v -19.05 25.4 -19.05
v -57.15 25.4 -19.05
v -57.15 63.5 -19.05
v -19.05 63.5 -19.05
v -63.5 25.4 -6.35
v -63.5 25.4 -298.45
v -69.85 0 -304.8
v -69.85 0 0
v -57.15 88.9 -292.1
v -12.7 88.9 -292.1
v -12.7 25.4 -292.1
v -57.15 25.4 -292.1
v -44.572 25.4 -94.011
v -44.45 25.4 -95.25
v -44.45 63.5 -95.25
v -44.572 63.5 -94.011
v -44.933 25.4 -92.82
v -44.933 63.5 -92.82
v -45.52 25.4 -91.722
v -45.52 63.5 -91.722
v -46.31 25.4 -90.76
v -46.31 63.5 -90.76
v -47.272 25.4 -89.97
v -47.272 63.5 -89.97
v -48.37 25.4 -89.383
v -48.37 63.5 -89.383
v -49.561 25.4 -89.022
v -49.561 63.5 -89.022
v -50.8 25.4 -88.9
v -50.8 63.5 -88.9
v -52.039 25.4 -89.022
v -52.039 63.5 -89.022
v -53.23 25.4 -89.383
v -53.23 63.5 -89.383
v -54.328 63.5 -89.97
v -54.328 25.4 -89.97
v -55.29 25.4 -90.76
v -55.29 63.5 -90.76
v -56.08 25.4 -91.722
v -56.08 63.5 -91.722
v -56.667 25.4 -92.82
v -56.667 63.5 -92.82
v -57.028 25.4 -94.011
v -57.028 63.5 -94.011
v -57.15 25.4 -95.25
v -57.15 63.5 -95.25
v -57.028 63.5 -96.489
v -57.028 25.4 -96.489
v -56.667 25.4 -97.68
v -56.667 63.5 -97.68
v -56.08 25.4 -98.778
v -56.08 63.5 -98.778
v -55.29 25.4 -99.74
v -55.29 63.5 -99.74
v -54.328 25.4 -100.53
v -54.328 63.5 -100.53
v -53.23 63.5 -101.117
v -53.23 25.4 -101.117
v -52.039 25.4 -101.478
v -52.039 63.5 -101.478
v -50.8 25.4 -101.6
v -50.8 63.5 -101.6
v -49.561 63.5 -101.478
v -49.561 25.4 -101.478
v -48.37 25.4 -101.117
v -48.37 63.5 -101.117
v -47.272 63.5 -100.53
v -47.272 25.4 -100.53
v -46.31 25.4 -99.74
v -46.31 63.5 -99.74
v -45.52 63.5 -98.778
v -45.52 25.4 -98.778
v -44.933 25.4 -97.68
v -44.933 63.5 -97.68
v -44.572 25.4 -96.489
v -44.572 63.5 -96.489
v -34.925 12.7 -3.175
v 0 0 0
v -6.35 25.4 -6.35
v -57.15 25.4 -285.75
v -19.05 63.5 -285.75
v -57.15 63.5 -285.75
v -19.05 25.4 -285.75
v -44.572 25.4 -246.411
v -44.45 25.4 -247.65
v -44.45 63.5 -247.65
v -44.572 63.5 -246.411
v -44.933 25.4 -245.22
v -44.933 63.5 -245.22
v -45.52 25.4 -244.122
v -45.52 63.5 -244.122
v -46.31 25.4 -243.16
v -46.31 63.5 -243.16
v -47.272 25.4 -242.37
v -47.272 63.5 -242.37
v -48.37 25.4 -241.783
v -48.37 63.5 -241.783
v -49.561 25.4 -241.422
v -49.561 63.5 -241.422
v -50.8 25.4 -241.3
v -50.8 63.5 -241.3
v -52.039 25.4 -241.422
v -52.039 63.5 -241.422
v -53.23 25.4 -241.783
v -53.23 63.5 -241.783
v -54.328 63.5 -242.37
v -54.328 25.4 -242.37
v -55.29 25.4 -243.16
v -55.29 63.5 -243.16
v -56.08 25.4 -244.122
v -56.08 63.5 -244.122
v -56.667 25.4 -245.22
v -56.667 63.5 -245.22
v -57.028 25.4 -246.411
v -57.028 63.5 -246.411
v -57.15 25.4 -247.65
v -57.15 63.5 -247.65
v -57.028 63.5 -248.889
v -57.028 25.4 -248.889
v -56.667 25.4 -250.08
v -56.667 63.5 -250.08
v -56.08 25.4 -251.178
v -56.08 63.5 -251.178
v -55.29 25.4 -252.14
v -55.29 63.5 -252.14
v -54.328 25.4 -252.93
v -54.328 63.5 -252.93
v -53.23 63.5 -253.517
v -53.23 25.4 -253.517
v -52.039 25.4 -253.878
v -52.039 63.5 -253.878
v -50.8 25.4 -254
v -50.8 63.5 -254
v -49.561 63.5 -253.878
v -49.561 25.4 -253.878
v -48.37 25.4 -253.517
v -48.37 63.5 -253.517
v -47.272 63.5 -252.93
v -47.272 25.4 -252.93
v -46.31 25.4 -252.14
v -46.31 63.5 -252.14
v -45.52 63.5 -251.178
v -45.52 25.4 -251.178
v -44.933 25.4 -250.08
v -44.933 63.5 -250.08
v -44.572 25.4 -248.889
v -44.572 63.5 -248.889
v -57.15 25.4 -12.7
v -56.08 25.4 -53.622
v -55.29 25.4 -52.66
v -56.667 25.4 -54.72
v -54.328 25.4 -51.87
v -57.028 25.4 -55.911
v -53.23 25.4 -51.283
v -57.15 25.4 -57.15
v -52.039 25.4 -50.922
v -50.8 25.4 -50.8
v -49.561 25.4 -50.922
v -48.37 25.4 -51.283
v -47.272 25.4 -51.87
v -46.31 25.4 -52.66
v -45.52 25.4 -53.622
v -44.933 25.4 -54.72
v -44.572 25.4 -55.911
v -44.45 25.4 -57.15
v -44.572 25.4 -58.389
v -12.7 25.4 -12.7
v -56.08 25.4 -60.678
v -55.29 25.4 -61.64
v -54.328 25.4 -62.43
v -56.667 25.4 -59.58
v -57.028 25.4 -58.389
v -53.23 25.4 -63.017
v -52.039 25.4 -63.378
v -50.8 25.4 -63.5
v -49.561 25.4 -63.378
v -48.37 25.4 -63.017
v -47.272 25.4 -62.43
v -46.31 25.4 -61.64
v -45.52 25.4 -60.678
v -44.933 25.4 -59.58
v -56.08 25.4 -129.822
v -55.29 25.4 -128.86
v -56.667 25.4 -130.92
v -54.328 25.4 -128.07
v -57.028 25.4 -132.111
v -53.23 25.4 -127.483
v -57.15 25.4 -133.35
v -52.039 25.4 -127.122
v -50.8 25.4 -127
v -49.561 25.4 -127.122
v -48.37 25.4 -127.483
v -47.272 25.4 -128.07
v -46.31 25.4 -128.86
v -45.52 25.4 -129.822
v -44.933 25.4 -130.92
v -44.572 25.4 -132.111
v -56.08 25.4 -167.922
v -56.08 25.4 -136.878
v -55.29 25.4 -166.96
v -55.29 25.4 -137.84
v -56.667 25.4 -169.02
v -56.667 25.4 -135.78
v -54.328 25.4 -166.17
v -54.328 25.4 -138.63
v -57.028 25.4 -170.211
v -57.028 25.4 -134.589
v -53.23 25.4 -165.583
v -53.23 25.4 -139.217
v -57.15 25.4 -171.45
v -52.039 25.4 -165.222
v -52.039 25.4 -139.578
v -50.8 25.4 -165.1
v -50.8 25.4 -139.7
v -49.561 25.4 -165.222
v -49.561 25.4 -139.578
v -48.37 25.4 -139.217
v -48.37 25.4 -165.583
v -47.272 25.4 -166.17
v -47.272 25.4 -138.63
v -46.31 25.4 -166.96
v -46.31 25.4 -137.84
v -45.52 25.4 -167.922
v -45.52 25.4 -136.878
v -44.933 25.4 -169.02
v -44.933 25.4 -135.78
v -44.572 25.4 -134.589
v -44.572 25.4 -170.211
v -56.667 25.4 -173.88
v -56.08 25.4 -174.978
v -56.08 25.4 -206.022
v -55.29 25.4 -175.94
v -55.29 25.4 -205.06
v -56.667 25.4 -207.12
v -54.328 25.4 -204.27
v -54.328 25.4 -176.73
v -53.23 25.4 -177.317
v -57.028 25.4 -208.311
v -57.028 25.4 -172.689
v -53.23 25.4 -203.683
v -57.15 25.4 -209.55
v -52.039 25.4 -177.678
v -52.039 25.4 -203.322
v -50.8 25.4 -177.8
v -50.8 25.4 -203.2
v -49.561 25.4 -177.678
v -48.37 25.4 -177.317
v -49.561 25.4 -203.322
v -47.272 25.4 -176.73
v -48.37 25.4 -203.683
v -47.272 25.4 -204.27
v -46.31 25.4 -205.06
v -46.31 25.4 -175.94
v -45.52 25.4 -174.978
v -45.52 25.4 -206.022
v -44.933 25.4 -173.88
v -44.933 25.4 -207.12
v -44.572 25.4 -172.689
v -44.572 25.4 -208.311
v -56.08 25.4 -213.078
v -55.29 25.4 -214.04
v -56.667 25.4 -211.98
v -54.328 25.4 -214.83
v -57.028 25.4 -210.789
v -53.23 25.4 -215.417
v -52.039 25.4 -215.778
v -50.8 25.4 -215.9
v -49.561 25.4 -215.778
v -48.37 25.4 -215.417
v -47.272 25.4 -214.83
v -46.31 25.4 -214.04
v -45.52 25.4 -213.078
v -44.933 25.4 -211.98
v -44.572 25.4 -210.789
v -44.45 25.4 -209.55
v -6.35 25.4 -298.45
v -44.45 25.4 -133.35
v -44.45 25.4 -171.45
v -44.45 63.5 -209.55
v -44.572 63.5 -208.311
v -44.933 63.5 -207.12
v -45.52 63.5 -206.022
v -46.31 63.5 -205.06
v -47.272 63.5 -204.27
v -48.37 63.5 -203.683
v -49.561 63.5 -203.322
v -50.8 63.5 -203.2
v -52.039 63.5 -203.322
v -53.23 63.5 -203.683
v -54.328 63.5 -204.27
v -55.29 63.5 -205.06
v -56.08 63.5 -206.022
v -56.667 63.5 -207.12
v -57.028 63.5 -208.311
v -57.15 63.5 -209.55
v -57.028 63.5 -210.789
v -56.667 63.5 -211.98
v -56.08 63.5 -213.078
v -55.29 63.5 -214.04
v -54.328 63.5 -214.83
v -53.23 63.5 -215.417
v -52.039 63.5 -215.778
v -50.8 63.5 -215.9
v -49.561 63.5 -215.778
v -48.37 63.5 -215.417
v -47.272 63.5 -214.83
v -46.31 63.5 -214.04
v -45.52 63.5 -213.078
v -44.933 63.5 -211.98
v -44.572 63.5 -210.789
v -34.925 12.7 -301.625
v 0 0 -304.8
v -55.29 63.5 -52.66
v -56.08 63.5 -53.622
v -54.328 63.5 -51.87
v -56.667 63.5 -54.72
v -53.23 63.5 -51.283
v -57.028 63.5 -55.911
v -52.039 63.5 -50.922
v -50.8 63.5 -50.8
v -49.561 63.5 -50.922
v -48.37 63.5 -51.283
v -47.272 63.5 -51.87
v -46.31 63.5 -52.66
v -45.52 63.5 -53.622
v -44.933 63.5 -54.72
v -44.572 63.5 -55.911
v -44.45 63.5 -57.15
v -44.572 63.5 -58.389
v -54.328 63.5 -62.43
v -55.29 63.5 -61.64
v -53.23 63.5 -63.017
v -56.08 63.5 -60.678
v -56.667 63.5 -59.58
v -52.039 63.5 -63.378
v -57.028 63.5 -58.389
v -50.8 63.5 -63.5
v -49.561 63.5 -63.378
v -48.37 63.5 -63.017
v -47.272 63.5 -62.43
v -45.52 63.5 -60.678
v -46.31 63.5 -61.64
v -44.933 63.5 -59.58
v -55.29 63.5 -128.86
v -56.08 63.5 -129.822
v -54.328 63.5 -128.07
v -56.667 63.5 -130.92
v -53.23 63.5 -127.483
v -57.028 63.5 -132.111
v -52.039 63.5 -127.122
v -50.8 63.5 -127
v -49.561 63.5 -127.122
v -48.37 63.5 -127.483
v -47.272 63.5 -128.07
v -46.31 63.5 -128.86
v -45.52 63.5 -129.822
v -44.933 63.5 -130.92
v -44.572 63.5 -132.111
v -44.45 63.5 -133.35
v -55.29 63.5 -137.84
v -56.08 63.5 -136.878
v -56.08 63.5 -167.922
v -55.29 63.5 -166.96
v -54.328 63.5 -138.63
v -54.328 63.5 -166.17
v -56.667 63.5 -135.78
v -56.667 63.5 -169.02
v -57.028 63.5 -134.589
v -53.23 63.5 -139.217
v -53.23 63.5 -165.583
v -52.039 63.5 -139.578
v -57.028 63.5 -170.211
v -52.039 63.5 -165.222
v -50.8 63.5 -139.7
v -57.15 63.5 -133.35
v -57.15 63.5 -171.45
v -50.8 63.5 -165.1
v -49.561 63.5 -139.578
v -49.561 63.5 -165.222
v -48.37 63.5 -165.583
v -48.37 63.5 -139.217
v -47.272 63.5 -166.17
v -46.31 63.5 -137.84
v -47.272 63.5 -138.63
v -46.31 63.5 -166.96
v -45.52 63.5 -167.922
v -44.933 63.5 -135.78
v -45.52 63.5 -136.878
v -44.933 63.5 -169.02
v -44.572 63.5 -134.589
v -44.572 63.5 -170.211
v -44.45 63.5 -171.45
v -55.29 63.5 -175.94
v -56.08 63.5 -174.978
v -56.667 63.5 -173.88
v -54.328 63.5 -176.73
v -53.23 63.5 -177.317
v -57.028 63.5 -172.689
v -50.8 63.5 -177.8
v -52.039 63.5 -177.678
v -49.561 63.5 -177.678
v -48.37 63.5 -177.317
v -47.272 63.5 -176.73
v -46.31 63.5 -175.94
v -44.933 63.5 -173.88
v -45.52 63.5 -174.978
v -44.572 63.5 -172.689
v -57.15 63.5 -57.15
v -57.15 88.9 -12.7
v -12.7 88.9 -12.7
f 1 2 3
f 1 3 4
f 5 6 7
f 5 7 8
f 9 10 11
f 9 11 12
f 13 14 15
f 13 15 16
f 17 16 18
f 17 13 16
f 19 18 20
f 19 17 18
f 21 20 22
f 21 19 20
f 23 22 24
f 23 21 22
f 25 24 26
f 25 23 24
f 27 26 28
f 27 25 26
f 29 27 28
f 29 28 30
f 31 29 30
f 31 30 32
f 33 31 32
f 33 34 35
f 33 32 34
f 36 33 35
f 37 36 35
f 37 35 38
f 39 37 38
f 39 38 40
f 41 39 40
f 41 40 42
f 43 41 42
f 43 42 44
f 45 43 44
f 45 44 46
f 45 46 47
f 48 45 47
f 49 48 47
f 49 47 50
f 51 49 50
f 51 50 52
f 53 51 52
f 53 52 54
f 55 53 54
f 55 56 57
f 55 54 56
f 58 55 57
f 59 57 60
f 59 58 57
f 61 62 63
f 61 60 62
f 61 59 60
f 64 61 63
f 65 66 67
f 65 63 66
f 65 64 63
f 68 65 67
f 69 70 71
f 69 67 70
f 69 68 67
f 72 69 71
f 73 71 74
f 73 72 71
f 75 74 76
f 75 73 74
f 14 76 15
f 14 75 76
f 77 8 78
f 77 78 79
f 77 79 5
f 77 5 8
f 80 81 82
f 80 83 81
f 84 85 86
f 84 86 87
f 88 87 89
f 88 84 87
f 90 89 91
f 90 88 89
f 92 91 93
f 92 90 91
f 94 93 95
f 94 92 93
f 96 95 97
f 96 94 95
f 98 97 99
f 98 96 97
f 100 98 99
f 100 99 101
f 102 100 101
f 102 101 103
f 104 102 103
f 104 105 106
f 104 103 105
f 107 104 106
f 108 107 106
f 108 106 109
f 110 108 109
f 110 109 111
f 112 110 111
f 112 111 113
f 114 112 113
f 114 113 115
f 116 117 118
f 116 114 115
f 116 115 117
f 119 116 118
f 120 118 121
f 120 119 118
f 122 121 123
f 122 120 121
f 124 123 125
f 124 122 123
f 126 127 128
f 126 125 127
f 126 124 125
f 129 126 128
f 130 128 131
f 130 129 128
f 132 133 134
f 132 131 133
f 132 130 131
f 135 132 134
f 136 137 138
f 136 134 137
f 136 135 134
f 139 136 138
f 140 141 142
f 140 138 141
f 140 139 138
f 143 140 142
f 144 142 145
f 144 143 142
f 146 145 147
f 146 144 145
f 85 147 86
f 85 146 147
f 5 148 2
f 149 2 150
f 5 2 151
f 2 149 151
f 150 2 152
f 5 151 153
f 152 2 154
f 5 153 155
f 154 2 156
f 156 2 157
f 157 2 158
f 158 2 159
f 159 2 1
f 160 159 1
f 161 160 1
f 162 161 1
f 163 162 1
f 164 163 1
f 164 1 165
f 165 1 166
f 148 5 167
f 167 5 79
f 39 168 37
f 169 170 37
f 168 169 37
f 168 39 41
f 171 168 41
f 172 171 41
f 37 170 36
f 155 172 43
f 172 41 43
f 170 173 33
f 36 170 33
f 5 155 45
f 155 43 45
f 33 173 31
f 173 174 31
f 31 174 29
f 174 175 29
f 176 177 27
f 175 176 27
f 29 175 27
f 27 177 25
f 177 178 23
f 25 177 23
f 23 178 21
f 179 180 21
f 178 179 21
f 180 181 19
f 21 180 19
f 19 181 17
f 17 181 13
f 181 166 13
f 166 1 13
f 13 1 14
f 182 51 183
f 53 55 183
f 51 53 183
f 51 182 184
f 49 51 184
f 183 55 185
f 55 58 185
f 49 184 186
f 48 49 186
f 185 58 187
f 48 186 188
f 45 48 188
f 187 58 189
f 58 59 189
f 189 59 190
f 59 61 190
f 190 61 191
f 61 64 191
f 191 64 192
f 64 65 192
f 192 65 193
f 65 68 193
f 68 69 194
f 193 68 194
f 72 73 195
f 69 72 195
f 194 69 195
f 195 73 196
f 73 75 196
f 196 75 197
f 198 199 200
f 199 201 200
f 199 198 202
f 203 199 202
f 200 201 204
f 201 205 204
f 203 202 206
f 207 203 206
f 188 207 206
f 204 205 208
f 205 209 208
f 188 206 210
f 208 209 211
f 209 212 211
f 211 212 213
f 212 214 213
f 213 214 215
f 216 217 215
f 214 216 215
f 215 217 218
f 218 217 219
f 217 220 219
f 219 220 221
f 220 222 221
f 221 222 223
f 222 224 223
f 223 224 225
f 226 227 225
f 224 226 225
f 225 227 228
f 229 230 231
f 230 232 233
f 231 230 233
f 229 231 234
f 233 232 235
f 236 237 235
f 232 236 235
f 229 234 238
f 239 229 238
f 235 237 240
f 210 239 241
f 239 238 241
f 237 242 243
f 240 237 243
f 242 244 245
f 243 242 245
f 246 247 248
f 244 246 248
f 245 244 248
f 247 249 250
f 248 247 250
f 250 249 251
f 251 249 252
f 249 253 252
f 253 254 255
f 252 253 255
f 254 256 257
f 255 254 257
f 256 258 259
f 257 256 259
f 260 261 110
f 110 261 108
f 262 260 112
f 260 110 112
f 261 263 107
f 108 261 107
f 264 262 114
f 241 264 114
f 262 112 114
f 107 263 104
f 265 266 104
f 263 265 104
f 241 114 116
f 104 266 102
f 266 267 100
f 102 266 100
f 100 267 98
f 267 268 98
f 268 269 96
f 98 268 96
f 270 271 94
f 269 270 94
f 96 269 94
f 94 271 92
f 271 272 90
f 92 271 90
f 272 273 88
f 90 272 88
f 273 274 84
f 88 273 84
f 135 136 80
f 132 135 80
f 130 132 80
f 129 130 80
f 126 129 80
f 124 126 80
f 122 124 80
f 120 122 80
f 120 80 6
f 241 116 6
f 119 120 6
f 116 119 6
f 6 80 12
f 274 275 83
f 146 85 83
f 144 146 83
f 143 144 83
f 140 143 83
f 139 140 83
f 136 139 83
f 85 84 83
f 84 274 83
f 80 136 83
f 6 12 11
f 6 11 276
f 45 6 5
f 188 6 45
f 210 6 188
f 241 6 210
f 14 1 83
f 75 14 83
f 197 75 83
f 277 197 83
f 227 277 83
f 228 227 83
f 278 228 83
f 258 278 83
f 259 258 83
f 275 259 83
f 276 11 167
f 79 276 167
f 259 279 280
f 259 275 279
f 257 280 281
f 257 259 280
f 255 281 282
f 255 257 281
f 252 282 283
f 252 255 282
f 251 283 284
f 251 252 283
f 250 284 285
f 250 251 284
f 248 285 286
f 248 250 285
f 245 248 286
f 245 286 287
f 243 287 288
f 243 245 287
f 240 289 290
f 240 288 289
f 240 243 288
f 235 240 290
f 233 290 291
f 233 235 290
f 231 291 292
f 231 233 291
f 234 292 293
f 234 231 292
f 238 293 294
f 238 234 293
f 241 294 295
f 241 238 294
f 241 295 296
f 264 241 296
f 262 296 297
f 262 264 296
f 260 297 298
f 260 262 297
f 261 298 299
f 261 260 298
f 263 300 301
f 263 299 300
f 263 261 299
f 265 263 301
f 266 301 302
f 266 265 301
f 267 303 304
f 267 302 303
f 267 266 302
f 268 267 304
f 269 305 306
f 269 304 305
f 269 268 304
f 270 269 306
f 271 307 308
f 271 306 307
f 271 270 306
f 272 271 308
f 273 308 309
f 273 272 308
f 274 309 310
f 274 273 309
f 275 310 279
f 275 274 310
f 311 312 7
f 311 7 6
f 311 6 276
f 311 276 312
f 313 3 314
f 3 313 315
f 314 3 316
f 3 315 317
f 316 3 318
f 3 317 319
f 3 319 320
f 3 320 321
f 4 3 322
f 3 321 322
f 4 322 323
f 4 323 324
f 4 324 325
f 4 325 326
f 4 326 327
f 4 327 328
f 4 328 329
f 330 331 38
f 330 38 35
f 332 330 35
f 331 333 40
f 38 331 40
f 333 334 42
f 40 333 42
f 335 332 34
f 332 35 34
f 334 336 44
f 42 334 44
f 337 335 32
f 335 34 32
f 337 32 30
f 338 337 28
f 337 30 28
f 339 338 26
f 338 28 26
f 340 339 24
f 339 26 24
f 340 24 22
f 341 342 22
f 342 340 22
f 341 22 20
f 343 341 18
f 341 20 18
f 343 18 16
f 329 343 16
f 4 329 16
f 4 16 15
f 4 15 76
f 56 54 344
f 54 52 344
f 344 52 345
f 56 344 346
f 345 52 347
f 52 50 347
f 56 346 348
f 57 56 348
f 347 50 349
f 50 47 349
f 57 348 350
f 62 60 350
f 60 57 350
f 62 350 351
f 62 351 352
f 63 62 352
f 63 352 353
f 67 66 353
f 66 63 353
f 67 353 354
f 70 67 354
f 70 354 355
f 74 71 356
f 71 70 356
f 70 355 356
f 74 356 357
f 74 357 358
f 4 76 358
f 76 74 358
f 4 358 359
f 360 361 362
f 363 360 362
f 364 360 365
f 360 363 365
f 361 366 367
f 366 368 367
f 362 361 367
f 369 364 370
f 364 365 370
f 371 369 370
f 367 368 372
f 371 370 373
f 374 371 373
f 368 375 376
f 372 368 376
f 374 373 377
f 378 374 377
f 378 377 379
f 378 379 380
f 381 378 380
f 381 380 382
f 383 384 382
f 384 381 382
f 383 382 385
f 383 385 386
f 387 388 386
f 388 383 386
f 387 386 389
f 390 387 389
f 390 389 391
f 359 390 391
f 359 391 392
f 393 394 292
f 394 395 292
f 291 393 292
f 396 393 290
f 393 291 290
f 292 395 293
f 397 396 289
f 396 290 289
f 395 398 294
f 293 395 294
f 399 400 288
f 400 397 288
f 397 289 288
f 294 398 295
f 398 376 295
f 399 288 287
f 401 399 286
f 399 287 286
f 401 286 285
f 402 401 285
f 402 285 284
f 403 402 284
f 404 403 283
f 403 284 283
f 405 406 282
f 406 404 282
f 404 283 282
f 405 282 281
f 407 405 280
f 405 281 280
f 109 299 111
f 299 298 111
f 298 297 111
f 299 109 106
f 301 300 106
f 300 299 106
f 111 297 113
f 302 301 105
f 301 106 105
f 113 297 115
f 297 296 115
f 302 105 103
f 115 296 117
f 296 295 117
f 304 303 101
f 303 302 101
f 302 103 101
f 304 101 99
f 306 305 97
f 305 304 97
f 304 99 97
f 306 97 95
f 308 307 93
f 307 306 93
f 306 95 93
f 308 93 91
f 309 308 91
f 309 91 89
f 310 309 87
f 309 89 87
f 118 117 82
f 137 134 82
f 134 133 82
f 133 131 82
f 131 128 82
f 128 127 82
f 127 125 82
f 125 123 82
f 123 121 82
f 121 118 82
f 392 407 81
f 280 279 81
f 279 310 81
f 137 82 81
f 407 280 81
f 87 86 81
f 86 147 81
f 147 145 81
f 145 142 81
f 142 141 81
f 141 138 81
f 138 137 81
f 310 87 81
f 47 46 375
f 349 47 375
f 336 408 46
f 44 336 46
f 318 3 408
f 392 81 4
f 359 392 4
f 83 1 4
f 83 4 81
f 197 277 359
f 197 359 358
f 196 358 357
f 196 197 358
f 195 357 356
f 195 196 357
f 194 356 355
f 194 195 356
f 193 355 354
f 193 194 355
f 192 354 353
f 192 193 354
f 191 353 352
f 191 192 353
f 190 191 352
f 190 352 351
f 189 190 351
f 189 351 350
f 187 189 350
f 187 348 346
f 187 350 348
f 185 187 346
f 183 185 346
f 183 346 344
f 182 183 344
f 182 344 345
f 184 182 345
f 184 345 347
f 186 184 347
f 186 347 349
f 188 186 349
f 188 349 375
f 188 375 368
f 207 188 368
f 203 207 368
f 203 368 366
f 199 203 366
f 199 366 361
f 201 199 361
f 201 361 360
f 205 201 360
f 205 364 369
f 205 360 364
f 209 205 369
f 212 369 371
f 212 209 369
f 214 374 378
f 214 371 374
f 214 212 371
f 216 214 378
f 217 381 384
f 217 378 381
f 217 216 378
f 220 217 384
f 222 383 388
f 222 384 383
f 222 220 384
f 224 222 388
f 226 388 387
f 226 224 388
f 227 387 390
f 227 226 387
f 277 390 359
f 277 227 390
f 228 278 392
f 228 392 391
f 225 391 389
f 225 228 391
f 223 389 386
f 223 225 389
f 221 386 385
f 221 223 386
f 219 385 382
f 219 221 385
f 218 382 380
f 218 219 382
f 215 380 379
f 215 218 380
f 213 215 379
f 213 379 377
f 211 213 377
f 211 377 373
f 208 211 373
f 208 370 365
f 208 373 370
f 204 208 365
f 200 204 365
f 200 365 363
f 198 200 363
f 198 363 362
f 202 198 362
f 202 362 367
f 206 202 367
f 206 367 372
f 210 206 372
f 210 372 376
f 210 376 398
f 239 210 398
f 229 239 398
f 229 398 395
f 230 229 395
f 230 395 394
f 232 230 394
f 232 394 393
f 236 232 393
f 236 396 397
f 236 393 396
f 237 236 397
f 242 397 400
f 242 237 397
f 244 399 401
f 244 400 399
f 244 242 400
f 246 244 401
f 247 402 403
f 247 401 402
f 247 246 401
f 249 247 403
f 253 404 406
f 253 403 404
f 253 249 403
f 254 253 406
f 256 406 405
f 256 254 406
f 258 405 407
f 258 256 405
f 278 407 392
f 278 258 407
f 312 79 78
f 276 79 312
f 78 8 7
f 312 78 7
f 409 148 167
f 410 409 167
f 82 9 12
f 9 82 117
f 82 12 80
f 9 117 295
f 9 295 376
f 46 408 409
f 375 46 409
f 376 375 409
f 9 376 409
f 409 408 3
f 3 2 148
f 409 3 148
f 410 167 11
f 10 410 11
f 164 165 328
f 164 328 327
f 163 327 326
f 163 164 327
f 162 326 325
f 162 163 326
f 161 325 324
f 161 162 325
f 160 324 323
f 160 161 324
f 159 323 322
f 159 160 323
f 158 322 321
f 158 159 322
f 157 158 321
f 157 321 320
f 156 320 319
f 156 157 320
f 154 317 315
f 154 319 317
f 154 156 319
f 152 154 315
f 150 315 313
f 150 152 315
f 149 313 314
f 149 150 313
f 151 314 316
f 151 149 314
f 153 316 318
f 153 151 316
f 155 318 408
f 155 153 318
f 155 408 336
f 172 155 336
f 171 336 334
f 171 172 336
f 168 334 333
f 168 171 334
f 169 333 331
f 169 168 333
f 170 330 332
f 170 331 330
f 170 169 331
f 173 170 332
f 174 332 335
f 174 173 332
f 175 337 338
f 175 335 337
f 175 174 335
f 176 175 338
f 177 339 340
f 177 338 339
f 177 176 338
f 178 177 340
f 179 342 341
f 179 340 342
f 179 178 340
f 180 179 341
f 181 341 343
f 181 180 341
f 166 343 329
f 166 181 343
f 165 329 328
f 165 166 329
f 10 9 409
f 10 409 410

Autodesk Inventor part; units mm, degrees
ref_plane "YZ Plane" through (0, 0, 0) normal (1, 0, 0) x (0, 1, 0)
ref_plane "XY Plane" through (0, 0, 0) normal (0, 0, 1) x (1, 0, 0)
sketch "Sketch1" plane through (0, 0, 0) normal (0, 1, 0) x (-1, 0, 0)
  line L0 (0, 0) -> (69.85, 0)
  line L1 (69.85, 0) -> (69.85, -304.8)
  line L2 (69.85, -304.8) -> (0, -304.8)
  line L3 (0, -304.8) -> (0, 0)
  dimension "d0" = 69.85
  dimension "d1" = 304.8
ref_plane "Work Plane1" through (0, 25.4, 0) normal (0, 1, 0) x (-1, 0, 0)
sketch "Sketch2" plane through (0, 25.4, 0) normal (0, 1, 0) x (-1, 0, 0)
  line L0 (0, 0) -> (69.85, 0) projected
  line L1 (69.85, 0) -> (69.85, -304.8) projected
  line L2 (69.85, -304.8) -> (0, -304.8) projected
  line L3 (0, -304.8) -> (0, 0) projected
  line L4 (63.5, -298.45) -> (63.5, -6.35)
  line L5 (63.5, -6.35) -> (6.35, -6.35)
  line L6 (6.35, -6.35) -> (6.35, -298.45)
  line L7 (6.35, -298.45) -> (63.5, -298.45)
  dimension "d3" = 6.35
loft "Loft1" add profiles "Sketch1", "Sketch2" contours all / L7 L6 L5 L4
sketch "Sketch3" plane through (-63.5, 25.4, -6.35) normal (0, 1, 0) x (1, 0, 0)
  line L0 (57.15, 0) -> (0, 0) projected
  line L1 (57.15, 292.1) -> (57.15, 0) projected
  line L2 (0, 292.1) -> (57.15, 292.1) projected
  line L3 (0, 0) -> (0, 292.1) projected
  line L4 (50.8, 6.35) -> (6.35, 6.35)
  line L5 (6.35, 285.75) -> (50.8, 285.75)
  line L6 (50.8, 285.75) -> (50.8, 6.35)
  line L7 (6.35, 12.7) -> (44.45, 12.7)
  line L8 (44.45, 12.7) -> (44.45, 279.4)
  line L9 (44.45, 279.4) -> (6.35, 279.4)
  line L10 (6.35, 6.35) -> (6.35, 12.7)
  line L11 (6.35, 279.4) -> (6.35, 285.75)
  circle A0 centre (12.7, 50.8) radius 6.35
  circle A1 centre (12.7, 88.9) radius 6.35
  circle A2 centre (12.7, 127) radius 6.35
  circle A3 centre (12.7, 165.1) radius 6.35
  circle A4 centre (12.7, 203.2) radius 6.35
  circle A5 centre (12.7, 241.3) radius 6.35
  point P0 (63.5, -6.35)
  dimension "d8" = 6.35
  dimension "d9" = 12.7
  dimension "d10" = 12.7
  dimension "d11" = 12.7
  dimension "d12" = 12.7
  dimension "d13" = 6.35
  dimension "d14" = 38.1
  dimension "d17" = 38.1
extrude "Extrusion1" add sketch "Sketch3" along normal blind 38.1 contours L4 L10 L7 L8 L9 L11 L5 L6 | A0 | A1 | A2 | A3 | A4 | A5
sketch "Sketch4" plane through (-63.5, 63.5, -6.35) normal (0, 1, 0) x (1, 0, 0)
  line L0 (6.35, 6.35) -> (50.8, 6.35)
  line L1 (50.8, 6.35) -> (50.8, 285.75)
  line L2 (50.8, 285.75) -> (6.35, 285.75)
  line L3 (6.35, 285.75) -> (6.35, 6.35)
  point P0 (63.5, -6.35)
extrude "Extrusion2" add sketch "Sketch4" along normal blind 25.4
properties part number "Side2"
